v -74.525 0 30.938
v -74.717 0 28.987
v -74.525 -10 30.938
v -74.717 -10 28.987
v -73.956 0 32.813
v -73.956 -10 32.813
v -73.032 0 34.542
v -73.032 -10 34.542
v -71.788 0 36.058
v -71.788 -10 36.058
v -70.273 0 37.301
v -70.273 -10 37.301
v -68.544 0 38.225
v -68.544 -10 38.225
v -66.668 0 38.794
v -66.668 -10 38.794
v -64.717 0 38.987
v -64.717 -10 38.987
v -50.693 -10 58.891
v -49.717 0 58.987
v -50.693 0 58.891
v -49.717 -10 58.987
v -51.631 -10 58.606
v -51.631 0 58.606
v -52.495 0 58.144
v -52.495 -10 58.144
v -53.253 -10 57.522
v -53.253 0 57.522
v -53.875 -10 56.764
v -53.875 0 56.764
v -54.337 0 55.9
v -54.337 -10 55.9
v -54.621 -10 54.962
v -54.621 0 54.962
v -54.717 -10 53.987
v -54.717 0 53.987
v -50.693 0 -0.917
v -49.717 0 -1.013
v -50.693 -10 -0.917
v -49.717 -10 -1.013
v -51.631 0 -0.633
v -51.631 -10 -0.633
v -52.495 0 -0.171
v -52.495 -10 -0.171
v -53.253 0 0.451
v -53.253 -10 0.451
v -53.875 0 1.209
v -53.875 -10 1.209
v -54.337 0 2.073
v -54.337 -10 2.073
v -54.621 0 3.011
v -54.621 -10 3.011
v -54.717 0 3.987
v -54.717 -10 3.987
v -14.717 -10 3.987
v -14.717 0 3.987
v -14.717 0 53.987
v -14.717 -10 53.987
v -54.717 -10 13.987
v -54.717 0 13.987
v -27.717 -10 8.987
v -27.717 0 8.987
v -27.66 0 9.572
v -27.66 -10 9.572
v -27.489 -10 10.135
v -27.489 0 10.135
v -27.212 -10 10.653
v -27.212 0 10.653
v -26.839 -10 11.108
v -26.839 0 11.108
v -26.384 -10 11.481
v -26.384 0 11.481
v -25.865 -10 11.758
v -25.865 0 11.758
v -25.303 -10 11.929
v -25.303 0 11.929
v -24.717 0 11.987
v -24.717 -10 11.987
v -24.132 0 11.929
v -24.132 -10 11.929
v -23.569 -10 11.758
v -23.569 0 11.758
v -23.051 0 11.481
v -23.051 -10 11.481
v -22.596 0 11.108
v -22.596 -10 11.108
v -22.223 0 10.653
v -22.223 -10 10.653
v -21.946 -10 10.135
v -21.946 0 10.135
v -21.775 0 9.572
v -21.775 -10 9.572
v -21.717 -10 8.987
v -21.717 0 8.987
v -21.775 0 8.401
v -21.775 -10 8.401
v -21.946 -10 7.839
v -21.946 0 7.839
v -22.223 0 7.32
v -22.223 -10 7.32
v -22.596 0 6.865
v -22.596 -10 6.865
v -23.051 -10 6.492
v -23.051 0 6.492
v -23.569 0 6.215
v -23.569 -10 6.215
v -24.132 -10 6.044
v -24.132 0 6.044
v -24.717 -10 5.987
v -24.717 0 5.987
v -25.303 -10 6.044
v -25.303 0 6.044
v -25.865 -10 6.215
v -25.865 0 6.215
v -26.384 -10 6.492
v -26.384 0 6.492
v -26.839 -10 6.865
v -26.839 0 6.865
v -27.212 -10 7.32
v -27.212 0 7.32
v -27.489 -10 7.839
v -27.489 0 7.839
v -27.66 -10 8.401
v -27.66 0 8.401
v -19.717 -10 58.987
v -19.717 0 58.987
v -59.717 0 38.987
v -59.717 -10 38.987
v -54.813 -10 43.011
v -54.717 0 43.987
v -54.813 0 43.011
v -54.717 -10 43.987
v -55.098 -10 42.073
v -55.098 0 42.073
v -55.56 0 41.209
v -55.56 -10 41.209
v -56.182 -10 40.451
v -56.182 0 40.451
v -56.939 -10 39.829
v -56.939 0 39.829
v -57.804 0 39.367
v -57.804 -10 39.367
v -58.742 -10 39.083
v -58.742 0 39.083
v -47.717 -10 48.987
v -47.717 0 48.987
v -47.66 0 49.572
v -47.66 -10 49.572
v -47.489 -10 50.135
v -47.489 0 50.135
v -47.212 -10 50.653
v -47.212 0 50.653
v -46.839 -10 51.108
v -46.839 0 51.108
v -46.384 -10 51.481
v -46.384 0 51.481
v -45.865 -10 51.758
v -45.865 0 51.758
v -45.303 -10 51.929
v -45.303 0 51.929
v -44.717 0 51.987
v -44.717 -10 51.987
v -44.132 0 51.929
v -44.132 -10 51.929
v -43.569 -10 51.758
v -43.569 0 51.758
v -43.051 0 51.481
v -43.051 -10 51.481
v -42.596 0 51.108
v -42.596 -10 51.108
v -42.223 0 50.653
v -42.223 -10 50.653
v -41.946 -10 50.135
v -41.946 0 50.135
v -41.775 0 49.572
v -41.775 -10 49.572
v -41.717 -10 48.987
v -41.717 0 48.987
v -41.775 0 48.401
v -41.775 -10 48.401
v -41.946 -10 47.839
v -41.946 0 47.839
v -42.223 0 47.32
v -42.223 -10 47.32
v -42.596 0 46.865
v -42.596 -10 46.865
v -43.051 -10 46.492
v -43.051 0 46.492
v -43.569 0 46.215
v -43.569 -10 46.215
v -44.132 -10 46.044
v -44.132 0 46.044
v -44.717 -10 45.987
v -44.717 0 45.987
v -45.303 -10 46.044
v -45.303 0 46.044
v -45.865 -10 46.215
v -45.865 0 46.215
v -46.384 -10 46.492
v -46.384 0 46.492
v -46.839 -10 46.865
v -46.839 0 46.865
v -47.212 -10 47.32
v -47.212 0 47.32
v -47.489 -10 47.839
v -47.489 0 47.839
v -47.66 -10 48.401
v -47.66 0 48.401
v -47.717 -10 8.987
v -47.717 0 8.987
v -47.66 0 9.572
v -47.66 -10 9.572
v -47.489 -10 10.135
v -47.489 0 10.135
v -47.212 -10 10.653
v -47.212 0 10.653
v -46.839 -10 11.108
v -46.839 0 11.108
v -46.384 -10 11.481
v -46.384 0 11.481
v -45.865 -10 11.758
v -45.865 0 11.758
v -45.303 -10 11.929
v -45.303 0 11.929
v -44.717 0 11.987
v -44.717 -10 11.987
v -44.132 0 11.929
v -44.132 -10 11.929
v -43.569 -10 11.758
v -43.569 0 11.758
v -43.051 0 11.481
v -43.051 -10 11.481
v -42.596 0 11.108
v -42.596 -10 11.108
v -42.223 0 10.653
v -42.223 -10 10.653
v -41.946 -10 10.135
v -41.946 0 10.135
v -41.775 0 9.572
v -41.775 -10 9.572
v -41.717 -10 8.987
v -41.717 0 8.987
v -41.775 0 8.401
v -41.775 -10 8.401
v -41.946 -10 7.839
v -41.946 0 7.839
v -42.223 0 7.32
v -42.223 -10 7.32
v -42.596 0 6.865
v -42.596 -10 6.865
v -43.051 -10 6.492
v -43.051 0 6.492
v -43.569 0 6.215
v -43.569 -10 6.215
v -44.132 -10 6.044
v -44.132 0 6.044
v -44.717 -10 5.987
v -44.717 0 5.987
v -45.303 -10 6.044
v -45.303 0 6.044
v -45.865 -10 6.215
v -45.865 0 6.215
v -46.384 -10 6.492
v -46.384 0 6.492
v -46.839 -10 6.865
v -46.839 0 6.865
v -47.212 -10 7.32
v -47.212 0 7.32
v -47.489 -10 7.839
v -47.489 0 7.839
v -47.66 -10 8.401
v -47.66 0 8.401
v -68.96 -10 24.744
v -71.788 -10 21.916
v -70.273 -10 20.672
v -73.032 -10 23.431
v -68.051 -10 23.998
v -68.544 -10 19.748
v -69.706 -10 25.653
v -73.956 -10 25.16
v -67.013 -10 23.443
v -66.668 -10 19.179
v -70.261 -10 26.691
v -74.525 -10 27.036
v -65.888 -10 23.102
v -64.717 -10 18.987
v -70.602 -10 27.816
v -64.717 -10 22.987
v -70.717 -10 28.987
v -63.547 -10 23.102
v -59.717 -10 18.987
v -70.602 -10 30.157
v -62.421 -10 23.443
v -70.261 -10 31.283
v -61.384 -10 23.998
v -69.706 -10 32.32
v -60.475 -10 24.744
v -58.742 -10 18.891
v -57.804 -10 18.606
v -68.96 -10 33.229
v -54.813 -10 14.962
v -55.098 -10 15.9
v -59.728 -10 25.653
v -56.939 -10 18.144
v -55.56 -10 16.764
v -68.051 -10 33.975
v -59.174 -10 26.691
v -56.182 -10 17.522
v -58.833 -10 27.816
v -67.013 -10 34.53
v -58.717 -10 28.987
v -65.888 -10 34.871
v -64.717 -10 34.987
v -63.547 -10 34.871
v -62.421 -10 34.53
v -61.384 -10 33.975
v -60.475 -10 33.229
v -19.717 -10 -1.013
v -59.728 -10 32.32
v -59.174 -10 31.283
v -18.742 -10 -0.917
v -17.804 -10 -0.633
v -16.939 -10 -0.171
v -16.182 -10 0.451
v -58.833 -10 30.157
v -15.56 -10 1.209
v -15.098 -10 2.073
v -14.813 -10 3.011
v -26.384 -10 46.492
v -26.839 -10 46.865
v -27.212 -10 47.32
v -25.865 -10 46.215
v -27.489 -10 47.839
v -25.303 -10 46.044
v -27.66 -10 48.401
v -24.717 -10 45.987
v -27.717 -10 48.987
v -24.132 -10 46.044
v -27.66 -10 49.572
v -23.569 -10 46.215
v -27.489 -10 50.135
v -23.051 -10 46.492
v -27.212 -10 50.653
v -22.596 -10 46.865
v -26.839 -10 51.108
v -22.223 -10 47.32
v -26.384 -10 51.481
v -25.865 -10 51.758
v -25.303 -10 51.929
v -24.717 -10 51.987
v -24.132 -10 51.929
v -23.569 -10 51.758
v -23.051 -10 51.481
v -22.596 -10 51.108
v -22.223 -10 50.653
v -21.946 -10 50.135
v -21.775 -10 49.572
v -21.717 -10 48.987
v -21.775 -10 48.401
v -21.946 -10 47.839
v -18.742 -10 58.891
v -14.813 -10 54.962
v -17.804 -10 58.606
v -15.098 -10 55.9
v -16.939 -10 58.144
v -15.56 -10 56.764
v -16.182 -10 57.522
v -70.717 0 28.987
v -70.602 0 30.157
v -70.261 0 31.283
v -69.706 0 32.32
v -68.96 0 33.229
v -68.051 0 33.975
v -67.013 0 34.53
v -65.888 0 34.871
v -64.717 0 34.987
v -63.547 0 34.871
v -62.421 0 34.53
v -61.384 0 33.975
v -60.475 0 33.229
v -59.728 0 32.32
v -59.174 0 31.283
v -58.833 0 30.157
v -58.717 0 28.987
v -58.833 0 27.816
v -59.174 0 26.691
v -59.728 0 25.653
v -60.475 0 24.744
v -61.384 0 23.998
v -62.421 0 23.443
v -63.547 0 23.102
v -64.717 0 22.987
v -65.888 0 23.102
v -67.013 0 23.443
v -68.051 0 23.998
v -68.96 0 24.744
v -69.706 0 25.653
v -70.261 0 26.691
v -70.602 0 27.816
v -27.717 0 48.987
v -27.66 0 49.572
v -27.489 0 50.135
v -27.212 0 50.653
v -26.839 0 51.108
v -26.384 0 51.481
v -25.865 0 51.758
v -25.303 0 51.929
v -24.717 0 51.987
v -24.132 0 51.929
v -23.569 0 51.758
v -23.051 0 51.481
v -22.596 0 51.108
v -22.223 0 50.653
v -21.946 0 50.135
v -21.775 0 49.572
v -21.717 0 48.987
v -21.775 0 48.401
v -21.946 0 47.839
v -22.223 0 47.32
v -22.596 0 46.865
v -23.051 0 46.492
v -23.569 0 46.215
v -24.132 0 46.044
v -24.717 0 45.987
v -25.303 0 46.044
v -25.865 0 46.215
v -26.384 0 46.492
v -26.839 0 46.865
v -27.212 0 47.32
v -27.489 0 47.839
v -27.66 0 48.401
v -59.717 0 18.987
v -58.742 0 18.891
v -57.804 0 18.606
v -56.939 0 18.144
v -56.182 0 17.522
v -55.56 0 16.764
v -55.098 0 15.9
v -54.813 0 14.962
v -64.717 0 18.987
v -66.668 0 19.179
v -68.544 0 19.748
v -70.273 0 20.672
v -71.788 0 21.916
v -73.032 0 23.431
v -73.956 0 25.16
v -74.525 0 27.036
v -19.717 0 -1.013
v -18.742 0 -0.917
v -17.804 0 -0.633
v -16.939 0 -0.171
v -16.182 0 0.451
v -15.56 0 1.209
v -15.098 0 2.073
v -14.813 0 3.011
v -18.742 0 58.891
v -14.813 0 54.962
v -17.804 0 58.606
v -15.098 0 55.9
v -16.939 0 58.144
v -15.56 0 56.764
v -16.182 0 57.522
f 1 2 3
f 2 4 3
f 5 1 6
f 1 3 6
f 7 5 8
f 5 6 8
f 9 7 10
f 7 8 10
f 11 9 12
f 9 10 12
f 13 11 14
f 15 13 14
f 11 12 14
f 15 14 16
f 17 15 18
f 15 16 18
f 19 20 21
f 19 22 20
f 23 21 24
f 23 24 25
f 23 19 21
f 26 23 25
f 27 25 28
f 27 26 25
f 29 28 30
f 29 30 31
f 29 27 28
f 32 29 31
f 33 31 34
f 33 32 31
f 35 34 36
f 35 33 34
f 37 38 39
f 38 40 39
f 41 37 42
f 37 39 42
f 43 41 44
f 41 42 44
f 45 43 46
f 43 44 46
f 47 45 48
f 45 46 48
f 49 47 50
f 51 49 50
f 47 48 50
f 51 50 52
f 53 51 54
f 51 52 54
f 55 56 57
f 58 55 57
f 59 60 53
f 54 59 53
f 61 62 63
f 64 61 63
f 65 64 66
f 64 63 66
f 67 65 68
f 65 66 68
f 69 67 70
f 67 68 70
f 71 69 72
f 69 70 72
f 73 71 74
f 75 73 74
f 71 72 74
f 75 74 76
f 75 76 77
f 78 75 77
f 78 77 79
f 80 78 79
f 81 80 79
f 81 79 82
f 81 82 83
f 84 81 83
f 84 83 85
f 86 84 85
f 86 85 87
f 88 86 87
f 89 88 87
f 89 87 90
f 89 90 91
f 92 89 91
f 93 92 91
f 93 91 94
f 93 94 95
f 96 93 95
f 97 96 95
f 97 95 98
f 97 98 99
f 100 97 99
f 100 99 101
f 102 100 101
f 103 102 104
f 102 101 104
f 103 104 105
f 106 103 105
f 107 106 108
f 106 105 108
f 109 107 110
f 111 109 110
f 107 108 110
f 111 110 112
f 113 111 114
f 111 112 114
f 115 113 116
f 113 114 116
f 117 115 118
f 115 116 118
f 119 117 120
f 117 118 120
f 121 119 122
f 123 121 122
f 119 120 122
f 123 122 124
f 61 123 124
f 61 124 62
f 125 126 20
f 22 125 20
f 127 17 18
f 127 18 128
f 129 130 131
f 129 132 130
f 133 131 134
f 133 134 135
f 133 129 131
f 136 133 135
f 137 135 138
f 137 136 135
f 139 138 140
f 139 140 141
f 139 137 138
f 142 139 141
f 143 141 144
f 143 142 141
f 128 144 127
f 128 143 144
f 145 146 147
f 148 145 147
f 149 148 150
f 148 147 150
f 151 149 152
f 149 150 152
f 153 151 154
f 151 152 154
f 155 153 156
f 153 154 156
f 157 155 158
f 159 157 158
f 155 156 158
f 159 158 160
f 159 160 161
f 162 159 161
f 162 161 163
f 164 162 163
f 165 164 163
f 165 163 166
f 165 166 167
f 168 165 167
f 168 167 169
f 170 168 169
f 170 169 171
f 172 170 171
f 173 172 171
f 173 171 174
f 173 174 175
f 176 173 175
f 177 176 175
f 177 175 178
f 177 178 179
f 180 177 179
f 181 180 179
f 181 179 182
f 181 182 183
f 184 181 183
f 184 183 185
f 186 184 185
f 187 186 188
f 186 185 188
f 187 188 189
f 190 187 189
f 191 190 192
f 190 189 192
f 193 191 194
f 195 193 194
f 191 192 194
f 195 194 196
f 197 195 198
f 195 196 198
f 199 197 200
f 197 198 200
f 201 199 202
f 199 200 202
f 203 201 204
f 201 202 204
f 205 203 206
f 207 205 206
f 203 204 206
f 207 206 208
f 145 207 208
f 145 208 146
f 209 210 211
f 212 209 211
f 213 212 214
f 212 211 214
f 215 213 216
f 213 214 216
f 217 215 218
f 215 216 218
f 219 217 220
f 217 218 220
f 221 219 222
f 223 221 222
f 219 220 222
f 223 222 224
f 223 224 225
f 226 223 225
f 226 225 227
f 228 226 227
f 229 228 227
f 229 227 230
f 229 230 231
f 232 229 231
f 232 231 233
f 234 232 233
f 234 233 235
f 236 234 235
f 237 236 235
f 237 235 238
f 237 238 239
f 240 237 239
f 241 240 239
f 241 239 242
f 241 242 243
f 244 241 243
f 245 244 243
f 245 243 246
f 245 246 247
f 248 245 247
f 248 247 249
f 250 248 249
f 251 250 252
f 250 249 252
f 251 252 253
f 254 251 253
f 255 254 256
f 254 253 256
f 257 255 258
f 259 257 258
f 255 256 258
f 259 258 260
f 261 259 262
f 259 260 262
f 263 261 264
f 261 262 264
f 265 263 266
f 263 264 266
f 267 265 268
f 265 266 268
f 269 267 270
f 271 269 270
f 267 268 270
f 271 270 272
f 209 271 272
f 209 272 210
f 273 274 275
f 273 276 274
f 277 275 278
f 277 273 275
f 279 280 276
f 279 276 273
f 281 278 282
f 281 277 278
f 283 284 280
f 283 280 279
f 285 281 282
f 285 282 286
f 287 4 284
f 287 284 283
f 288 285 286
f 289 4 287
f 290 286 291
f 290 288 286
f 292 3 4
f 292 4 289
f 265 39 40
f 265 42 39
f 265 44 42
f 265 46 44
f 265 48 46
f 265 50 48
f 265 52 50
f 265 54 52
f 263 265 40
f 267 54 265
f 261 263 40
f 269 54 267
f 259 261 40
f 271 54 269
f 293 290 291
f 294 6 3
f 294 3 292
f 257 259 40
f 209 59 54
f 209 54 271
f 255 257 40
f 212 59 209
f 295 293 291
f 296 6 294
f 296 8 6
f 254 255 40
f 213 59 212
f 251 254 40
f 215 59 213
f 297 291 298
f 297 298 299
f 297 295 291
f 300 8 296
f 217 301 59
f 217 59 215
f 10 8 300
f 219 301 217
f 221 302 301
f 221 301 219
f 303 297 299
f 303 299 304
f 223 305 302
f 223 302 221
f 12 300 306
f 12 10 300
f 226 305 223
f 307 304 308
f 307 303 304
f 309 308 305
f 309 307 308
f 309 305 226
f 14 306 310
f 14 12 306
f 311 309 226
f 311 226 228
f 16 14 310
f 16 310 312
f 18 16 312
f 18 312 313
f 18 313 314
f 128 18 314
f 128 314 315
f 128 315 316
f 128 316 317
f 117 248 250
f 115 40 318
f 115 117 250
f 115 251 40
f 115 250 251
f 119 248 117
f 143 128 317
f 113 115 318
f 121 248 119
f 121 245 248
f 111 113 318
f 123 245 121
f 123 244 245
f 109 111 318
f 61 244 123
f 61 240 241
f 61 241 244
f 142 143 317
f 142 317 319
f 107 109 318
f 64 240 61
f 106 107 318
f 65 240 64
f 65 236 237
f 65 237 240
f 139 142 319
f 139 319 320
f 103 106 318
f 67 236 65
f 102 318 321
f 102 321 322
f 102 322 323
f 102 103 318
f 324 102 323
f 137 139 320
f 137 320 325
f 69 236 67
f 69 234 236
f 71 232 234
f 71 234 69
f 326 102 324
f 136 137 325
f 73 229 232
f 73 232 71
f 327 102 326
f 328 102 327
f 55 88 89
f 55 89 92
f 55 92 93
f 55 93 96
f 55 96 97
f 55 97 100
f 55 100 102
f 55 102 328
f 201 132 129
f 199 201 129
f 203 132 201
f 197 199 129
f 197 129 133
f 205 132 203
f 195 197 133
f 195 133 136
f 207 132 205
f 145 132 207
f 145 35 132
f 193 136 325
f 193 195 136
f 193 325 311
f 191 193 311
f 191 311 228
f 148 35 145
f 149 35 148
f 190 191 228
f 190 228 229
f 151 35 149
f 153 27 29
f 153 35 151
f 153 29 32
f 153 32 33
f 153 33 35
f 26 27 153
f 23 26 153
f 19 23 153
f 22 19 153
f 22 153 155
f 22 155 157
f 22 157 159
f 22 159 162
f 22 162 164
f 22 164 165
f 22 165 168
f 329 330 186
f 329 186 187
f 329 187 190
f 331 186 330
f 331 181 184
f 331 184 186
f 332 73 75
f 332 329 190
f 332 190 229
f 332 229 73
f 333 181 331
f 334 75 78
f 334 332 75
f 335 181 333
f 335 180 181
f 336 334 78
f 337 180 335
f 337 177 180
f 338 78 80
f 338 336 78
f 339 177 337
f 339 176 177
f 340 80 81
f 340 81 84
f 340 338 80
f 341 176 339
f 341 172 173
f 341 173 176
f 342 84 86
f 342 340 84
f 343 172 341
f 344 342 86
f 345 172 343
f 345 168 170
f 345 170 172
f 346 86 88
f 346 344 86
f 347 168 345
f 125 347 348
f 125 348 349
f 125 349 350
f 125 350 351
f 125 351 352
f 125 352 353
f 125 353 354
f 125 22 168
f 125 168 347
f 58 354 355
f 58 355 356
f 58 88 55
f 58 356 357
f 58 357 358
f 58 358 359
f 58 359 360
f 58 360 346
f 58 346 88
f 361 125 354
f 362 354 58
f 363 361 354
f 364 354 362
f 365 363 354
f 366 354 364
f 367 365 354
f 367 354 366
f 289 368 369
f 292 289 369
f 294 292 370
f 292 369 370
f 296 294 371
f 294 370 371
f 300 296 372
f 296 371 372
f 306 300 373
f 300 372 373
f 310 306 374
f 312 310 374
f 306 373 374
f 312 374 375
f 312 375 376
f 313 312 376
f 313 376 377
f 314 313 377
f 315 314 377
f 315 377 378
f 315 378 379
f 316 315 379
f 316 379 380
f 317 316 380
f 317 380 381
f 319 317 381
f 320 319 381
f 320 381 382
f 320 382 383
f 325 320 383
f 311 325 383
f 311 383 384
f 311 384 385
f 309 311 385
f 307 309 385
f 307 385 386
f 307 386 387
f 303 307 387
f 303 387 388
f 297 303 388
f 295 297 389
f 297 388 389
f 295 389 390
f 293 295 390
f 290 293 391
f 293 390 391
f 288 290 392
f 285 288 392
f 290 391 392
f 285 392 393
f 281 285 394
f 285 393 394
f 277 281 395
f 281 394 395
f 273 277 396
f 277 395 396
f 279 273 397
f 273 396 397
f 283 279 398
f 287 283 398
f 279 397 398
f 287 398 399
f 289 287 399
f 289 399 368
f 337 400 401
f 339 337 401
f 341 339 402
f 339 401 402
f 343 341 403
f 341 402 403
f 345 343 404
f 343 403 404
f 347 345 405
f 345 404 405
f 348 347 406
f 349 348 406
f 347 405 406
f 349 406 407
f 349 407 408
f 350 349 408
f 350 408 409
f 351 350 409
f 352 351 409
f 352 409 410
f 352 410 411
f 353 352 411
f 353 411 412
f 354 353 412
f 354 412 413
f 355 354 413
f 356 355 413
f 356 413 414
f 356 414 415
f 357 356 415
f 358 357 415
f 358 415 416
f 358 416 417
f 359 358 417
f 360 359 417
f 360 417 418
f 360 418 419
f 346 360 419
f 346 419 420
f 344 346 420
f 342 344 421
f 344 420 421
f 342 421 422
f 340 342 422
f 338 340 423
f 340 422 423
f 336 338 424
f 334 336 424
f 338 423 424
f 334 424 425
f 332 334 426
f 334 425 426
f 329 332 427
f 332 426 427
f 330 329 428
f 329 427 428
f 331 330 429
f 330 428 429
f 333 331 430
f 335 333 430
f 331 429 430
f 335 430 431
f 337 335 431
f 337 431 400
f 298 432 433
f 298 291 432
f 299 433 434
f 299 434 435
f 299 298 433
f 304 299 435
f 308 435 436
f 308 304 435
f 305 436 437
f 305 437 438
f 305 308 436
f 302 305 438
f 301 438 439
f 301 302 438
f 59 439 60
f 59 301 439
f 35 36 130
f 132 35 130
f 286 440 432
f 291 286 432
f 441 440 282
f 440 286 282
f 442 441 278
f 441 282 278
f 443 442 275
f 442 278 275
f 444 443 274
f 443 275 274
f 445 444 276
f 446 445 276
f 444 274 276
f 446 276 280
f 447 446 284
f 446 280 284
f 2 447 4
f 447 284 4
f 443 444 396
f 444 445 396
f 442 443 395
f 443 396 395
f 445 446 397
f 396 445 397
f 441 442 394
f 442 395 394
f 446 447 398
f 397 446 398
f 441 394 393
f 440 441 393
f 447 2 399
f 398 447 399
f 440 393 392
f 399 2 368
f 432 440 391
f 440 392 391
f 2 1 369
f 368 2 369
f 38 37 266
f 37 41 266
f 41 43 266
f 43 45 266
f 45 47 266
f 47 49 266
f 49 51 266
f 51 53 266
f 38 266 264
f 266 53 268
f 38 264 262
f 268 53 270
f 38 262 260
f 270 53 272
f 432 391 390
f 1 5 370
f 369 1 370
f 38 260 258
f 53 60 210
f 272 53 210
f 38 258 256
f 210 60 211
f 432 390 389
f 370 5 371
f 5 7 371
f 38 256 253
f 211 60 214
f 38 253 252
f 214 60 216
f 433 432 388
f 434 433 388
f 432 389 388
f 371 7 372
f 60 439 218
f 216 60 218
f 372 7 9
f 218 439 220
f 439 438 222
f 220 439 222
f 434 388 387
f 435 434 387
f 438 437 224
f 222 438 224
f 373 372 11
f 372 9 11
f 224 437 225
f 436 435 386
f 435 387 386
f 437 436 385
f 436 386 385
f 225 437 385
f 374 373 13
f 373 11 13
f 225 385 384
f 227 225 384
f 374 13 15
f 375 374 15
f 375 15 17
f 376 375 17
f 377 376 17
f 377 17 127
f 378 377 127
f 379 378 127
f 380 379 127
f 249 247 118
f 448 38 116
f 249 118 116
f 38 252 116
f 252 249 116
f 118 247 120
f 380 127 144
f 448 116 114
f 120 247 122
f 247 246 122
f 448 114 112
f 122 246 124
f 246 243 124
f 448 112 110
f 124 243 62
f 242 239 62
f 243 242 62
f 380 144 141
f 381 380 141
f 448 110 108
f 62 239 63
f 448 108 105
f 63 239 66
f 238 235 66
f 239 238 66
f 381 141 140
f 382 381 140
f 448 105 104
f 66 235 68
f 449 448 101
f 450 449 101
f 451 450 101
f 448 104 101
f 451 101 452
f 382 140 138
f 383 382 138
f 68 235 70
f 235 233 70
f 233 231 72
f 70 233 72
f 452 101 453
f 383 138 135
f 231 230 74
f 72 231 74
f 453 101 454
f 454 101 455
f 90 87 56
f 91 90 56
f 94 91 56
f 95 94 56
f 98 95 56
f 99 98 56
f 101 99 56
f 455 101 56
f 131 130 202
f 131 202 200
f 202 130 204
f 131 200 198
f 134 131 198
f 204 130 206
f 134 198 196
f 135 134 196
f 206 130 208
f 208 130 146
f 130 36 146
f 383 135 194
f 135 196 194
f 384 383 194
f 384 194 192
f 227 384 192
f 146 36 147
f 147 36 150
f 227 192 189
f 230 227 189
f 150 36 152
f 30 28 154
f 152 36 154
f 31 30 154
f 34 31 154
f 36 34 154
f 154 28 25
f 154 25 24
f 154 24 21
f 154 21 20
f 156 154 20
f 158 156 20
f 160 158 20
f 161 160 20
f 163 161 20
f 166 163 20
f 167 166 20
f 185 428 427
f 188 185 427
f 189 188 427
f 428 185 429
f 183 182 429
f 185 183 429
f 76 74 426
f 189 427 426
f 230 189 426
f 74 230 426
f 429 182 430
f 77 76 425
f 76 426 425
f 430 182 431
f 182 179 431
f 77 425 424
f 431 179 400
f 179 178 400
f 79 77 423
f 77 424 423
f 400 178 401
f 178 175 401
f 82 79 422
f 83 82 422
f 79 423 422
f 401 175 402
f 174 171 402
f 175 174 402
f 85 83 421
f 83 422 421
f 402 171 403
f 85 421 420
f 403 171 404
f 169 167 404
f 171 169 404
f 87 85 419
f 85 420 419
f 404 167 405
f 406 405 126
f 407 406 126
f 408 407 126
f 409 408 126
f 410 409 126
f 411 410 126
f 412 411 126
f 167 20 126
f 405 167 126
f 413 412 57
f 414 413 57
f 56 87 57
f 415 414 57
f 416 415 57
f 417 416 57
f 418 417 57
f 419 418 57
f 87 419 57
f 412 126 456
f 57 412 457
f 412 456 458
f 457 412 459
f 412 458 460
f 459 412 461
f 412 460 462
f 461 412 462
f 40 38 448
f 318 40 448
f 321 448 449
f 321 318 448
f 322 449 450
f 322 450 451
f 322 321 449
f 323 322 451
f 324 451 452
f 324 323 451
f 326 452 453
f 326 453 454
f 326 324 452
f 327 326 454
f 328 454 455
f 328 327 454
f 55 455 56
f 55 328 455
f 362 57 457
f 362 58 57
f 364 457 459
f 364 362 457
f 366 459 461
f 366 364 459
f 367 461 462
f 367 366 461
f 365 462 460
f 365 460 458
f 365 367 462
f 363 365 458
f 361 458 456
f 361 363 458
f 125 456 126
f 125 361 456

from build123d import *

# Parameters (mm, degrees)
F0_W     = 20
F0_H     = 20
F1_DEPTH = 10
F2_R     = 5
F3_R     = 9.99999
F5_D     = 6
F7_D     = 12


# Not quite as in the source:
# - a fillet or chamfer is up to 0.001 mm smaller than in the source, because OpenCascade refuses the exact size


with BuildPart() as f1:
    # F0 (on Front) → F1 (new body)
    with BuildSketch(Plane.XZ):
        Polygon((-54.7173006759, -1.0133752964), (-14.7173006759, -1.0133752964), (-14.7173006759, 58.9866247036), (-54.7173006759, 58.9866247036), (-54.7173006759, 38.9866247036), (-54.7173006759, 18.9866247036), align=None)
        with Locations((-64.7173006759, 28.9866247036)):
            Rectangle(F0_W, F0_H)
    extrude(amount=F1_DEPTH)

    # F2
    f2_edges = [f1.edges().sort_by_distance(p)[0] for p in [
        (-54.717301, -5, 58.986625),
        (-54.717301, -5, -1.013375),
        (-14.717301, -5, 58.986625),
        (-14.717301, -5, -1.013375),
        (-54.717301, -5, 18.986625),
        (-54.717301, -5, 38.986625),
    ]]
    fillet(f2_edges, radius=F2_R)

    # F3 (radius 10 in the source; OpenCascade refuses exactly that, so slightly less here)
    f3_edges = [f1.edges().sort_by_distance(p)[0] for p in [
        (-74.717301, -5, 38.986625),
        (-74.717301, -5, 18.986625),
    ]]
    fillet(f3_edges, radius=F3_R)

    # F5 (through all)
    with Locations(Plane.XZ.offset(10)):
        with Locations((-44.7173006759, 48.9866247036), (-24.7173006759, 48.9866247036), (-24.7173006759, 8.9866247036), (-44.7173006759, 8.9866247036)):
            Hole(F5_D / 2)

    # F7 (through all)
    with Locations(Plane.XZ.offset(10)):
        with Locations((-64.7173006759, 28.9866247036)):
            Hole(F7_D / 2)


solid = f1.part
